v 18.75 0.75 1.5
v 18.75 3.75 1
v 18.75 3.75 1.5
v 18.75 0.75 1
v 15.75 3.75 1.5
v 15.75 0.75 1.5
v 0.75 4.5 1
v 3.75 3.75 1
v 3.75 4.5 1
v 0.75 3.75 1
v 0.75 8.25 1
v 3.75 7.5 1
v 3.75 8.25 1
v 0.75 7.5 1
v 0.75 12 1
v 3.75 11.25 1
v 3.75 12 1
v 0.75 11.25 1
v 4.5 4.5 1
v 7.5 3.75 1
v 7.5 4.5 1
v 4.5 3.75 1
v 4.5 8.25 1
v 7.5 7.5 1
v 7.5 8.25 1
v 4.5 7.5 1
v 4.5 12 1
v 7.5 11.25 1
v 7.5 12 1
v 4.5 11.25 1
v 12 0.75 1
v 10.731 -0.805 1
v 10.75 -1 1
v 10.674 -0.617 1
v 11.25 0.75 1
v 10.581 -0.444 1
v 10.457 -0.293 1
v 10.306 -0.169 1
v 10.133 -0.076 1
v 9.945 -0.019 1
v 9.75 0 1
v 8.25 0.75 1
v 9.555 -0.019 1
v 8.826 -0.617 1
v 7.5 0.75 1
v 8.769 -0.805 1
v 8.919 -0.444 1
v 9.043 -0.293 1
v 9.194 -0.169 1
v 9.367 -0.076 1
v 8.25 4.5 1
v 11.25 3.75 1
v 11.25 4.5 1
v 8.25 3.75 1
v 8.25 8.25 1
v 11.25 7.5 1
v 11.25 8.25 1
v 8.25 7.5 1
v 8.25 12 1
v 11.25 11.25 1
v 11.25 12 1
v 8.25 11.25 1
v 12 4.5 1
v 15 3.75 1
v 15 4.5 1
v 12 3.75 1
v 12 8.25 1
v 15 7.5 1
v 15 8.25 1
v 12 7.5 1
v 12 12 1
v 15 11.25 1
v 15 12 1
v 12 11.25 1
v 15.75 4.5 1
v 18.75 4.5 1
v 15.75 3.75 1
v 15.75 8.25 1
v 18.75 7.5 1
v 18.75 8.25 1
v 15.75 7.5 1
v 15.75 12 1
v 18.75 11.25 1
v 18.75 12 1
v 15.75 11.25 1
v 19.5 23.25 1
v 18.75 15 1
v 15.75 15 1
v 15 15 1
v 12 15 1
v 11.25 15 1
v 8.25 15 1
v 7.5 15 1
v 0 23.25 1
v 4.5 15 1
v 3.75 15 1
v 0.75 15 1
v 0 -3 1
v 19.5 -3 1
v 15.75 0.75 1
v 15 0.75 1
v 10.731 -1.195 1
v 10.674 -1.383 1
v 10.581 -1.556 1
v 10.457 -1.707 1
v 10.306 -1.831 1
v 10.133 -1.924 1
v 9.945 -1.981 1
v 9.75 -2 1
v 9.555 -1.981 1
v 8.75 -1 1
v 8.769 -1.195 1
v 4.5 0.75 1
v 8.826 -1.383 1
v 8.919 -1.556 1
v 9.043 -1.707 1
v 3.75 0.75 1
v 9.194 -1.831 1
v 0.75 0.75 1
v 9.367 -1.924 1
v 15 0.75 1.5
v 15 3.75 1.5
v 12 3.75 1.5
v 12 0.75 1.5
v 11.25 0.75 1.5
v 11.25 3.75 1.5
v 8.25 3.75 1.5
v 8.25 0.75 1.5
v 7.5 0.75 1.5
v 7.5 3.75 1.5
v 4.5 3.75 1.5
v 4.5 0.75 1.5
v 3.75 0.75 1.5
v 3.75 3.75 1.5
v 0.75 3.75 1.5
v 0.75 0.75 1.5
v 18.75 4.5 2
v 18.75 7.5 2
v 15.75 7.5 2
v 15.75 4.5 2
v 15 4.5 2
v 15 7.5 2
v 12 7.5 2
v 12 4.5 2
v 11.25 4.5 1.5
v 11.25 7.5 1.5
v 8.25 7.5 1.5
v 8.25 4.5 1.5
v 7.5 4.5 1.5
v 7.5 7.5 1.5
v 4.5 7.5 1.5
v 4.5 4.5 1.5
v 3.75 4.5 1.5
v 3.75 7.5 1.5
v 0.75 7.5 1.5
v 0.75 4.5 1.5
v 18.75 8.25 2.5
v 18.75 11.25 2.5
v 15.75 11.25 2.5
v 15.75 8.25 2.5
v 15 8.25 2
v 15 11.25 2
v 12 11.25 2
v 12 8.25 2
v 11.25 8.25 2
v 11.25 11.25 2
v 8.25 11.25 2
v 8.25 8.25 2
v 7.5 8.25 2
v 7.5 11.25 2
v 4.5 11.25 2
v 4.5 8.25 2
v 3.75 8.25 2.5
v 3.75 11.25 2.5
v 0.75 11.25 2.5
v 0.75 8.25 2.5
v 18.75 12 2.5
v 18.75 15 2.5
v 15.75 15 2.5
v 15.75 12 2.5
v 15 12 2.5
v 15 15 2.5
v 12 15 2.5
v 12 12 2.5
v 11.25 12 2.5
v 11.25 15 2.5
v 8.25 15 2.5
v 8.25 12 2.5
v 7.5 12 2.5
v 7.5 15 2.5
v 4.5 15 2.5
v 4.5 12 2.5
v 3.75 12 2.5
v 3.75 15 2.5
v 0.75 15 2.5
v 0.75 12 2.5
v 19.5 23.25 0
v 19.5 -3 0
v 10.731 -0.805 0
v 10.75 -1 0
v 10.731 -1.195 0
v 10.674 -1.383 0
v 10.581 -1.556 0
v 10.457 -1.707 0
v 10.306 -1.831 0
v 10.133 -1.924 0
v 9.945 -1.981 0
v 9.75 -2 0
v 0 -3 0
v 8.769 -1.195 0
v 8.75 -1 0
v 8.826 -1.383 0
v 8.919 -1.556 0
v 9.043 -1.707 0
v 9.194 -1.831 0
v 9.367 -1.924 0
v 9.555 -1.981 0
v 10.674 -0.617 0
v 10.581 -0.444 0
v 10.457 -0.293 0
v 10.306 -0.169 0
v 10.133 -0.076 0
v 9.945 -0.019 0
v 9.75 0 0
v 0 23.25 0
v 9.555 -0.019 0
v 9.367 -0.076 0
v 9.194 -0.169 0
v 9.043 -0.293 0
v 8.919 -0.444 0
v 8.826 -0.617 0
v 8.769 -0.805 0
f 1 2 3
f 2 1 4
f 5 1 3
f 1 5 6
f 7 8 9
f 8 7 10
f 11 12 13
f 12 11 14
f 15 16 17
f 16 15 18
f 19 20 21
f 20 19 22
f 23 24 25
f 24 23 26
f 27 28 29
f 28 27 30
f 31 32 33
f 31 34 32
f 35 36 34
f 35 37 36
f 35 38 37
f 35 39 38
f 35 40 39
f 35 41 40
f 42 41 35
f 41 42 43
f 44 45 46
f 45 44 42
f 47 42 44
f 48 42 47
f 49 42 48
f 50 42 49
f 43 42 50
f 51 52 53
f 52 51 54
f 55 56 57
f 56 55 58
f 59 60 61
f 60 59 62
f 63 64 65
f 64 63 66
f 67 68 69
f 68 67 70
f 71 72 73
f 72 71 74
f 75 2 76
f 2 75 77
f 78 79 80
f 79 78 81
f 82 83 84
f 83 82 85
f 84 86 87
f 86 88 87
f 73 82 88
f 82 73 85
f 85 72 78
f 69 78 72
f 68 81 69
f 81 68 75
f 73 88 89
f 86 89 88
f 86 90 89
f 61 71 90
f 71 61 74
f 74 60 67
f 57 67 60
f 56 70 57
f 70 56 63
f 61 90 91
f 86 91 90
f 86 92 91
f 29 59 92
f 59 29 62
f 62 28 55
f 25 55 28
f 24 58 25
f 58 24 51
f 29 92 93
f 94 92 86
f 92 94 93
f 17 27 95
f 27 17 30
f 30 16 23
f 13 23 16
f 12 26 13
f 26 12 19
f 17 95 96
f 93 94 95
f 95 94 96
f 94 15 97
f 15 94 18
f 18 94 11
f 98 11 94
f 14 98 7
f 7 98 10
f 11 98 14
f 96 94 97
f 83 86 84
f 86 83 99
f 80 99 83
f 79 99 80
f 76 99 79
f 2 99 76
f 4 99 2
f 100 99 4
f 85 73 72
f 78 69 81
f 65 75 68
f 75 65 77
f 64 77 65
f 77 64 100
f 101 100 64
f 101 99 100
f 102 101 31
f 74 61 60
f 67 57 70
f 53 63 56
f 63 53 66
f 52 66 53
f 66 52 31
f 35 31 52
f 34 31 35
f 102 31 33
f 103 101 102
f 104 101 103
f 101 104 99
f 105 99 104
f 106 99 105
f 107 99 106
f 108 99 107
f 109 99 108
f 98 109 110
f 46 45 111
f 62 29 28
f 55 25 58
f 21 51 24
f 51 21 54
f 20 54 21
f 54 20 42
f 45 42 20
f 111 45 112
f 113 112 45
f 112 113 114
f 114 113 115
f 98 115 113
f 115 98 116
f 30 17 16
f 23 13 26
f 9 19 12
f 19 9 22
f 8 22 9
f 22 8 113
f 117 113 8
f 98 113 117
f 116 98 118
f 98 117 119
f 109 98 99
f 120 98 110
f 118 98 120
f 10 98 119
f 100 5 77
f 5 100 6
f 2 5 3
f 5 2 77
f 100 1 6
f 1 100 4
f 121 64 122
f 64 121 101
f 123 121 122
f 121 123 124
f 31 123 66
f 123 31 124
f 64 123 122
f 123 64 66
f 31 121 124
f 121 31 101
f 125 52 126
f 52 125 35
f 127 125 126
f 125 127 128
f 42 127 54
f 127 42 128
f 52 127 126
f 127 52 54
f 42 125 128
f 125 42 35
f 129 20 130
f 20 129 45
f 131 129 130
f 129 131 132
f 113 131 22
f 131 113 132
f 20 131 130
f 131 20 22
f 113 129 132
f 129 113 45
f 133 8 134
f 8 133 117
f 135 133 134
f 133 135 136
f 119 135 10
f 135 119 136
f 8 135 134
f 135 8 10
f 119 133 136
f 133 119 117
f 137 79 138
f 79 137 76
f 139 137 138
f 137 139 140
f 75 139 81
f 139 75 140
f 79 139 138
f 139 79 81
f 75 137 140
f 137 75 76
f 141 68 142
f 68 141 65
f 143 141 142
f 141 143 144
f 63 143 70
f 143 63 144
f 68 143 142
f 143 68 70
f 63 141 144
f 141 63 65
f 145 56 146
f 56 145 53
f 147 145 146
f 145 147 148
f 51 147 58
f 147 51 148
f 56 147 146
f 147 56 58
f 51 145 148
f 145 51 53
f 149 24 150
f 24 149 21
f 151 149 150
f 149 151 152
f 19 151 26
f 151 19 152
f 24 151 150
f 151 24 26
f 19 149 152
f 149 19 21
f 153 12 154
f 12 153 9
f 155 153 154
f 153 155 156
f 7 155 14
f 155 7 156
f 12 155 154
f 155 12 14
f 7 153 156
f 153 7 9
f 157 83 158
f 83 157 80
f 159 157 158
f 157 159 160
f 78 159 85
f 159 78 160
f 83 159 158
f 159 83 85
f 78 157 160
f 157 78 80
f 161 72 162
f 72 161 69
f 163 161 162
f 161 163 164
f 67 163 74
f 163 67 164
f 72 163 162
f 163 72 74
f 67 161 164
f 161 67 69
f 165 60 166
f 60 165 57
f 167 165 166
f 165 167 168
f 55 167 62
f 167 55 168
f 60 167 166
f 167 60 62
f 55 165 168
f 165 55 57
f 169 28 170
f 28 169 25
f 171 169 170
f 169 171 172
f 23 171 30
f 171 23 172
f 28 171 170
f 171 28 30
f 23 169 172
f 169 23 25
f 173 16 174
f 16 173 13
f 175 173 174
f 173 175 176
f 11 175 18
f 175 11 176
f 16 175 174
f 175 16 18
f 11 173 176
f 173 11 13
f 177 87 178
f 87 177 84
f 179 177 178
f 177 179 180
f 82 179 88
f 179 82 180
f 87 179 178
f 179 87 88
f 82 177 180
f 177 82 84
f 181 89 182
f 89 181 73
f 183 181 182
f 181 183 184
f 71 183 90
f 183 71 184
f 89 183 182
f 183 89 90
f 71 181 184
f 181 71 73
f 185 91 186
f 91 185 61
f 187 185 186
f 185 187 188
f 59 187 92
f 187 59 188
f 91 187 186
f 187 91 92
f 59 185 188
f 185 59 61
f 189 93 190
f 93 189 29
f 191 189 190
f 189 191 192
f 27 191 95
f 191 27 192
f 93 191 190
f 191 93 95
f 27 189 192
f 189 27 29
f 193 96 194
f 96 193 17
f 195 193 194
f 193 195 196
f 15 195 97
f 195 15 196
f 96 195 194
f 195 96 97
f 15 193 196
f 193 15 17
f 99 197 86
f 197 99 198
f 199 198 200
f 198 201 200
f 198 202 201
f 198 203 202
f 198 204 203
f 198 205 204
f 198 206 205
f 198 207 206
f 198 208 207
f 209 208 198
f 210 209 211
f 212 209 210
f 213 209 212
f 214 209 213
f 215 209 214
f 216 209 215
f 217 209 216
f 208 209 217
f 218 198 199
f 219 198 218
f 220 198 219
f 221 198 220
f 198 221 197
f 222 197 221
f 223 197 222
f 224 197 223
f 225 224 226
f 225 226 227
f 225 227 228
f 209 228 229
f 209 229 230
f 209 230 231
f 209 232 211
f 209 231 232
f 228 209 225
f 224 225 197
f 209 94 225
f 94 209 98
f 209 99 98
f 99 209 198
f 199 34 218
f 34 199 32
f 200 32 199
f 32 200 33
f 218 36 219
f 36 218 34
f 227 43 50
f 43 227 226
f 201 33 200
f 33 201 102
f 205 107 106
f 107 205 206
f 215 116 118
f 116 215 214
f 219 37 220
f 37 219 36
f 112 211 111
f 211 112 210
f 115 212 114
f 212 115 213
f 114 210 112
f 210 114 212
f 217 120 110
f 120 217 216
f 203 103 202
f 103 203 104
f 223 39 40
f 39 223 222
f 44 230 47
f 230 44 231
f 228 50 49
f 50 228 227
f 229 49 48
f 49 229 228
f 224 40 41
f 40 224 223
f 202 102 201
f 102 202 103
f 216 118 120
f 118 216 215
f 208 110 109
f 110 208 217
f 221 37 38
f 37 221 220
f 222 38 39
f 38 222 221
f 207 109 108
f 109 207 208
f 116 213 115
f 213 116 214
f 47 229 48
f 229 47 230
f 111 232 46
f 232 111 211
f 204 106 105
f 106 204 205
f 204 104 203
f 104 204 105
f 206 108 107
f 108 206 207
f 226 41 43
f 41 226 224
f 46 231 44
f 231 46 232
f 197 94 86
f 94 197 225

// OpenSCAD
guesses=4;
cubeSize=3;
margin=0.75;
boardThickness=1;
includeBacking = true;
includeUnusedGuesses = true;

//This is an array of all the letter guesses.  The numbers
//are the height the letter will be printed at (which facilitates
//the color changes). The actual heights are configurable. The order
//is going to be consistent:
//Lowest Height - Wrong guesses (grey/black)
//Middle Height - Misplaced Letters (yellow)
//Highest Height - Correct Letters (green)
letters = [[0.5,0.5,0.5,0.5,0.5],[1,1,0.5,0.5,0.5],[1.5,1,1,1,1.5],[1.5,1.5,1.5,1.5,1.5]];

//The width of our board is going to be five cubes (for each of the letters)
//And six margins (the space around the letters)
boardWidth = (cubeSize * 5) + (margin*6);

//The board size depends if we are going to include unused guesses/words.abs
//If are including that, it'll be six cube lengths (for the six guesses)
//and seven margins.  Otherwise, we'll go by the number of guesses.  There 
//will always be one extra margin than cubes.
boardHeight=  includeUnusedGuesses ? (cubeSize * 6) + (margin*7) : (cubeSize*guesses) + (margin * (guesses+1));

echo(boardWidth);
echo(boardHeight);

//We make a cube-- this is our backing for all our letters/words.
cube([boardWidth, boardHeight, boardThickness]);

//Now we are going to loop through all our guesses and each letter 
//for those guesses to make our letter cubes. Each cube will be positioned
//(using translate).  The height is determined by our letter array.
for (i = [0:guesses-1]) 
    { 
        for (j = [0:4])
        {
            //Retrieving the cube thickness from the array
            cubeThickness = letters[i][j];


            //Making the cube and putting it in the right place.
            //The 4-j makes sure the letters go from right to left 
            translate([((4-j)*cubeSize)+(((4-j)-1)*margin)+margin*2,(i*cubeSize)+((i-1)*margin)+margin*2, boardThickness])
            cube([cubeSize, cubeSize, cubeThickness]);
        }
        
        
    }

//For Earrings and Pendants, we are also going to include a small
//backing with a hole
if (includeBacking)
{
    //We will be subtracting a 2mm diameter cylinder from our 
    //backing
    difference()
    {

        translate([0, -3, 0])
        cube([boardWidth, 3, boardThickness]);
        
        $fn=32;
        translate([boardWidth/2,-1,0])
        cylinder(4, 1, true);
    }
}
